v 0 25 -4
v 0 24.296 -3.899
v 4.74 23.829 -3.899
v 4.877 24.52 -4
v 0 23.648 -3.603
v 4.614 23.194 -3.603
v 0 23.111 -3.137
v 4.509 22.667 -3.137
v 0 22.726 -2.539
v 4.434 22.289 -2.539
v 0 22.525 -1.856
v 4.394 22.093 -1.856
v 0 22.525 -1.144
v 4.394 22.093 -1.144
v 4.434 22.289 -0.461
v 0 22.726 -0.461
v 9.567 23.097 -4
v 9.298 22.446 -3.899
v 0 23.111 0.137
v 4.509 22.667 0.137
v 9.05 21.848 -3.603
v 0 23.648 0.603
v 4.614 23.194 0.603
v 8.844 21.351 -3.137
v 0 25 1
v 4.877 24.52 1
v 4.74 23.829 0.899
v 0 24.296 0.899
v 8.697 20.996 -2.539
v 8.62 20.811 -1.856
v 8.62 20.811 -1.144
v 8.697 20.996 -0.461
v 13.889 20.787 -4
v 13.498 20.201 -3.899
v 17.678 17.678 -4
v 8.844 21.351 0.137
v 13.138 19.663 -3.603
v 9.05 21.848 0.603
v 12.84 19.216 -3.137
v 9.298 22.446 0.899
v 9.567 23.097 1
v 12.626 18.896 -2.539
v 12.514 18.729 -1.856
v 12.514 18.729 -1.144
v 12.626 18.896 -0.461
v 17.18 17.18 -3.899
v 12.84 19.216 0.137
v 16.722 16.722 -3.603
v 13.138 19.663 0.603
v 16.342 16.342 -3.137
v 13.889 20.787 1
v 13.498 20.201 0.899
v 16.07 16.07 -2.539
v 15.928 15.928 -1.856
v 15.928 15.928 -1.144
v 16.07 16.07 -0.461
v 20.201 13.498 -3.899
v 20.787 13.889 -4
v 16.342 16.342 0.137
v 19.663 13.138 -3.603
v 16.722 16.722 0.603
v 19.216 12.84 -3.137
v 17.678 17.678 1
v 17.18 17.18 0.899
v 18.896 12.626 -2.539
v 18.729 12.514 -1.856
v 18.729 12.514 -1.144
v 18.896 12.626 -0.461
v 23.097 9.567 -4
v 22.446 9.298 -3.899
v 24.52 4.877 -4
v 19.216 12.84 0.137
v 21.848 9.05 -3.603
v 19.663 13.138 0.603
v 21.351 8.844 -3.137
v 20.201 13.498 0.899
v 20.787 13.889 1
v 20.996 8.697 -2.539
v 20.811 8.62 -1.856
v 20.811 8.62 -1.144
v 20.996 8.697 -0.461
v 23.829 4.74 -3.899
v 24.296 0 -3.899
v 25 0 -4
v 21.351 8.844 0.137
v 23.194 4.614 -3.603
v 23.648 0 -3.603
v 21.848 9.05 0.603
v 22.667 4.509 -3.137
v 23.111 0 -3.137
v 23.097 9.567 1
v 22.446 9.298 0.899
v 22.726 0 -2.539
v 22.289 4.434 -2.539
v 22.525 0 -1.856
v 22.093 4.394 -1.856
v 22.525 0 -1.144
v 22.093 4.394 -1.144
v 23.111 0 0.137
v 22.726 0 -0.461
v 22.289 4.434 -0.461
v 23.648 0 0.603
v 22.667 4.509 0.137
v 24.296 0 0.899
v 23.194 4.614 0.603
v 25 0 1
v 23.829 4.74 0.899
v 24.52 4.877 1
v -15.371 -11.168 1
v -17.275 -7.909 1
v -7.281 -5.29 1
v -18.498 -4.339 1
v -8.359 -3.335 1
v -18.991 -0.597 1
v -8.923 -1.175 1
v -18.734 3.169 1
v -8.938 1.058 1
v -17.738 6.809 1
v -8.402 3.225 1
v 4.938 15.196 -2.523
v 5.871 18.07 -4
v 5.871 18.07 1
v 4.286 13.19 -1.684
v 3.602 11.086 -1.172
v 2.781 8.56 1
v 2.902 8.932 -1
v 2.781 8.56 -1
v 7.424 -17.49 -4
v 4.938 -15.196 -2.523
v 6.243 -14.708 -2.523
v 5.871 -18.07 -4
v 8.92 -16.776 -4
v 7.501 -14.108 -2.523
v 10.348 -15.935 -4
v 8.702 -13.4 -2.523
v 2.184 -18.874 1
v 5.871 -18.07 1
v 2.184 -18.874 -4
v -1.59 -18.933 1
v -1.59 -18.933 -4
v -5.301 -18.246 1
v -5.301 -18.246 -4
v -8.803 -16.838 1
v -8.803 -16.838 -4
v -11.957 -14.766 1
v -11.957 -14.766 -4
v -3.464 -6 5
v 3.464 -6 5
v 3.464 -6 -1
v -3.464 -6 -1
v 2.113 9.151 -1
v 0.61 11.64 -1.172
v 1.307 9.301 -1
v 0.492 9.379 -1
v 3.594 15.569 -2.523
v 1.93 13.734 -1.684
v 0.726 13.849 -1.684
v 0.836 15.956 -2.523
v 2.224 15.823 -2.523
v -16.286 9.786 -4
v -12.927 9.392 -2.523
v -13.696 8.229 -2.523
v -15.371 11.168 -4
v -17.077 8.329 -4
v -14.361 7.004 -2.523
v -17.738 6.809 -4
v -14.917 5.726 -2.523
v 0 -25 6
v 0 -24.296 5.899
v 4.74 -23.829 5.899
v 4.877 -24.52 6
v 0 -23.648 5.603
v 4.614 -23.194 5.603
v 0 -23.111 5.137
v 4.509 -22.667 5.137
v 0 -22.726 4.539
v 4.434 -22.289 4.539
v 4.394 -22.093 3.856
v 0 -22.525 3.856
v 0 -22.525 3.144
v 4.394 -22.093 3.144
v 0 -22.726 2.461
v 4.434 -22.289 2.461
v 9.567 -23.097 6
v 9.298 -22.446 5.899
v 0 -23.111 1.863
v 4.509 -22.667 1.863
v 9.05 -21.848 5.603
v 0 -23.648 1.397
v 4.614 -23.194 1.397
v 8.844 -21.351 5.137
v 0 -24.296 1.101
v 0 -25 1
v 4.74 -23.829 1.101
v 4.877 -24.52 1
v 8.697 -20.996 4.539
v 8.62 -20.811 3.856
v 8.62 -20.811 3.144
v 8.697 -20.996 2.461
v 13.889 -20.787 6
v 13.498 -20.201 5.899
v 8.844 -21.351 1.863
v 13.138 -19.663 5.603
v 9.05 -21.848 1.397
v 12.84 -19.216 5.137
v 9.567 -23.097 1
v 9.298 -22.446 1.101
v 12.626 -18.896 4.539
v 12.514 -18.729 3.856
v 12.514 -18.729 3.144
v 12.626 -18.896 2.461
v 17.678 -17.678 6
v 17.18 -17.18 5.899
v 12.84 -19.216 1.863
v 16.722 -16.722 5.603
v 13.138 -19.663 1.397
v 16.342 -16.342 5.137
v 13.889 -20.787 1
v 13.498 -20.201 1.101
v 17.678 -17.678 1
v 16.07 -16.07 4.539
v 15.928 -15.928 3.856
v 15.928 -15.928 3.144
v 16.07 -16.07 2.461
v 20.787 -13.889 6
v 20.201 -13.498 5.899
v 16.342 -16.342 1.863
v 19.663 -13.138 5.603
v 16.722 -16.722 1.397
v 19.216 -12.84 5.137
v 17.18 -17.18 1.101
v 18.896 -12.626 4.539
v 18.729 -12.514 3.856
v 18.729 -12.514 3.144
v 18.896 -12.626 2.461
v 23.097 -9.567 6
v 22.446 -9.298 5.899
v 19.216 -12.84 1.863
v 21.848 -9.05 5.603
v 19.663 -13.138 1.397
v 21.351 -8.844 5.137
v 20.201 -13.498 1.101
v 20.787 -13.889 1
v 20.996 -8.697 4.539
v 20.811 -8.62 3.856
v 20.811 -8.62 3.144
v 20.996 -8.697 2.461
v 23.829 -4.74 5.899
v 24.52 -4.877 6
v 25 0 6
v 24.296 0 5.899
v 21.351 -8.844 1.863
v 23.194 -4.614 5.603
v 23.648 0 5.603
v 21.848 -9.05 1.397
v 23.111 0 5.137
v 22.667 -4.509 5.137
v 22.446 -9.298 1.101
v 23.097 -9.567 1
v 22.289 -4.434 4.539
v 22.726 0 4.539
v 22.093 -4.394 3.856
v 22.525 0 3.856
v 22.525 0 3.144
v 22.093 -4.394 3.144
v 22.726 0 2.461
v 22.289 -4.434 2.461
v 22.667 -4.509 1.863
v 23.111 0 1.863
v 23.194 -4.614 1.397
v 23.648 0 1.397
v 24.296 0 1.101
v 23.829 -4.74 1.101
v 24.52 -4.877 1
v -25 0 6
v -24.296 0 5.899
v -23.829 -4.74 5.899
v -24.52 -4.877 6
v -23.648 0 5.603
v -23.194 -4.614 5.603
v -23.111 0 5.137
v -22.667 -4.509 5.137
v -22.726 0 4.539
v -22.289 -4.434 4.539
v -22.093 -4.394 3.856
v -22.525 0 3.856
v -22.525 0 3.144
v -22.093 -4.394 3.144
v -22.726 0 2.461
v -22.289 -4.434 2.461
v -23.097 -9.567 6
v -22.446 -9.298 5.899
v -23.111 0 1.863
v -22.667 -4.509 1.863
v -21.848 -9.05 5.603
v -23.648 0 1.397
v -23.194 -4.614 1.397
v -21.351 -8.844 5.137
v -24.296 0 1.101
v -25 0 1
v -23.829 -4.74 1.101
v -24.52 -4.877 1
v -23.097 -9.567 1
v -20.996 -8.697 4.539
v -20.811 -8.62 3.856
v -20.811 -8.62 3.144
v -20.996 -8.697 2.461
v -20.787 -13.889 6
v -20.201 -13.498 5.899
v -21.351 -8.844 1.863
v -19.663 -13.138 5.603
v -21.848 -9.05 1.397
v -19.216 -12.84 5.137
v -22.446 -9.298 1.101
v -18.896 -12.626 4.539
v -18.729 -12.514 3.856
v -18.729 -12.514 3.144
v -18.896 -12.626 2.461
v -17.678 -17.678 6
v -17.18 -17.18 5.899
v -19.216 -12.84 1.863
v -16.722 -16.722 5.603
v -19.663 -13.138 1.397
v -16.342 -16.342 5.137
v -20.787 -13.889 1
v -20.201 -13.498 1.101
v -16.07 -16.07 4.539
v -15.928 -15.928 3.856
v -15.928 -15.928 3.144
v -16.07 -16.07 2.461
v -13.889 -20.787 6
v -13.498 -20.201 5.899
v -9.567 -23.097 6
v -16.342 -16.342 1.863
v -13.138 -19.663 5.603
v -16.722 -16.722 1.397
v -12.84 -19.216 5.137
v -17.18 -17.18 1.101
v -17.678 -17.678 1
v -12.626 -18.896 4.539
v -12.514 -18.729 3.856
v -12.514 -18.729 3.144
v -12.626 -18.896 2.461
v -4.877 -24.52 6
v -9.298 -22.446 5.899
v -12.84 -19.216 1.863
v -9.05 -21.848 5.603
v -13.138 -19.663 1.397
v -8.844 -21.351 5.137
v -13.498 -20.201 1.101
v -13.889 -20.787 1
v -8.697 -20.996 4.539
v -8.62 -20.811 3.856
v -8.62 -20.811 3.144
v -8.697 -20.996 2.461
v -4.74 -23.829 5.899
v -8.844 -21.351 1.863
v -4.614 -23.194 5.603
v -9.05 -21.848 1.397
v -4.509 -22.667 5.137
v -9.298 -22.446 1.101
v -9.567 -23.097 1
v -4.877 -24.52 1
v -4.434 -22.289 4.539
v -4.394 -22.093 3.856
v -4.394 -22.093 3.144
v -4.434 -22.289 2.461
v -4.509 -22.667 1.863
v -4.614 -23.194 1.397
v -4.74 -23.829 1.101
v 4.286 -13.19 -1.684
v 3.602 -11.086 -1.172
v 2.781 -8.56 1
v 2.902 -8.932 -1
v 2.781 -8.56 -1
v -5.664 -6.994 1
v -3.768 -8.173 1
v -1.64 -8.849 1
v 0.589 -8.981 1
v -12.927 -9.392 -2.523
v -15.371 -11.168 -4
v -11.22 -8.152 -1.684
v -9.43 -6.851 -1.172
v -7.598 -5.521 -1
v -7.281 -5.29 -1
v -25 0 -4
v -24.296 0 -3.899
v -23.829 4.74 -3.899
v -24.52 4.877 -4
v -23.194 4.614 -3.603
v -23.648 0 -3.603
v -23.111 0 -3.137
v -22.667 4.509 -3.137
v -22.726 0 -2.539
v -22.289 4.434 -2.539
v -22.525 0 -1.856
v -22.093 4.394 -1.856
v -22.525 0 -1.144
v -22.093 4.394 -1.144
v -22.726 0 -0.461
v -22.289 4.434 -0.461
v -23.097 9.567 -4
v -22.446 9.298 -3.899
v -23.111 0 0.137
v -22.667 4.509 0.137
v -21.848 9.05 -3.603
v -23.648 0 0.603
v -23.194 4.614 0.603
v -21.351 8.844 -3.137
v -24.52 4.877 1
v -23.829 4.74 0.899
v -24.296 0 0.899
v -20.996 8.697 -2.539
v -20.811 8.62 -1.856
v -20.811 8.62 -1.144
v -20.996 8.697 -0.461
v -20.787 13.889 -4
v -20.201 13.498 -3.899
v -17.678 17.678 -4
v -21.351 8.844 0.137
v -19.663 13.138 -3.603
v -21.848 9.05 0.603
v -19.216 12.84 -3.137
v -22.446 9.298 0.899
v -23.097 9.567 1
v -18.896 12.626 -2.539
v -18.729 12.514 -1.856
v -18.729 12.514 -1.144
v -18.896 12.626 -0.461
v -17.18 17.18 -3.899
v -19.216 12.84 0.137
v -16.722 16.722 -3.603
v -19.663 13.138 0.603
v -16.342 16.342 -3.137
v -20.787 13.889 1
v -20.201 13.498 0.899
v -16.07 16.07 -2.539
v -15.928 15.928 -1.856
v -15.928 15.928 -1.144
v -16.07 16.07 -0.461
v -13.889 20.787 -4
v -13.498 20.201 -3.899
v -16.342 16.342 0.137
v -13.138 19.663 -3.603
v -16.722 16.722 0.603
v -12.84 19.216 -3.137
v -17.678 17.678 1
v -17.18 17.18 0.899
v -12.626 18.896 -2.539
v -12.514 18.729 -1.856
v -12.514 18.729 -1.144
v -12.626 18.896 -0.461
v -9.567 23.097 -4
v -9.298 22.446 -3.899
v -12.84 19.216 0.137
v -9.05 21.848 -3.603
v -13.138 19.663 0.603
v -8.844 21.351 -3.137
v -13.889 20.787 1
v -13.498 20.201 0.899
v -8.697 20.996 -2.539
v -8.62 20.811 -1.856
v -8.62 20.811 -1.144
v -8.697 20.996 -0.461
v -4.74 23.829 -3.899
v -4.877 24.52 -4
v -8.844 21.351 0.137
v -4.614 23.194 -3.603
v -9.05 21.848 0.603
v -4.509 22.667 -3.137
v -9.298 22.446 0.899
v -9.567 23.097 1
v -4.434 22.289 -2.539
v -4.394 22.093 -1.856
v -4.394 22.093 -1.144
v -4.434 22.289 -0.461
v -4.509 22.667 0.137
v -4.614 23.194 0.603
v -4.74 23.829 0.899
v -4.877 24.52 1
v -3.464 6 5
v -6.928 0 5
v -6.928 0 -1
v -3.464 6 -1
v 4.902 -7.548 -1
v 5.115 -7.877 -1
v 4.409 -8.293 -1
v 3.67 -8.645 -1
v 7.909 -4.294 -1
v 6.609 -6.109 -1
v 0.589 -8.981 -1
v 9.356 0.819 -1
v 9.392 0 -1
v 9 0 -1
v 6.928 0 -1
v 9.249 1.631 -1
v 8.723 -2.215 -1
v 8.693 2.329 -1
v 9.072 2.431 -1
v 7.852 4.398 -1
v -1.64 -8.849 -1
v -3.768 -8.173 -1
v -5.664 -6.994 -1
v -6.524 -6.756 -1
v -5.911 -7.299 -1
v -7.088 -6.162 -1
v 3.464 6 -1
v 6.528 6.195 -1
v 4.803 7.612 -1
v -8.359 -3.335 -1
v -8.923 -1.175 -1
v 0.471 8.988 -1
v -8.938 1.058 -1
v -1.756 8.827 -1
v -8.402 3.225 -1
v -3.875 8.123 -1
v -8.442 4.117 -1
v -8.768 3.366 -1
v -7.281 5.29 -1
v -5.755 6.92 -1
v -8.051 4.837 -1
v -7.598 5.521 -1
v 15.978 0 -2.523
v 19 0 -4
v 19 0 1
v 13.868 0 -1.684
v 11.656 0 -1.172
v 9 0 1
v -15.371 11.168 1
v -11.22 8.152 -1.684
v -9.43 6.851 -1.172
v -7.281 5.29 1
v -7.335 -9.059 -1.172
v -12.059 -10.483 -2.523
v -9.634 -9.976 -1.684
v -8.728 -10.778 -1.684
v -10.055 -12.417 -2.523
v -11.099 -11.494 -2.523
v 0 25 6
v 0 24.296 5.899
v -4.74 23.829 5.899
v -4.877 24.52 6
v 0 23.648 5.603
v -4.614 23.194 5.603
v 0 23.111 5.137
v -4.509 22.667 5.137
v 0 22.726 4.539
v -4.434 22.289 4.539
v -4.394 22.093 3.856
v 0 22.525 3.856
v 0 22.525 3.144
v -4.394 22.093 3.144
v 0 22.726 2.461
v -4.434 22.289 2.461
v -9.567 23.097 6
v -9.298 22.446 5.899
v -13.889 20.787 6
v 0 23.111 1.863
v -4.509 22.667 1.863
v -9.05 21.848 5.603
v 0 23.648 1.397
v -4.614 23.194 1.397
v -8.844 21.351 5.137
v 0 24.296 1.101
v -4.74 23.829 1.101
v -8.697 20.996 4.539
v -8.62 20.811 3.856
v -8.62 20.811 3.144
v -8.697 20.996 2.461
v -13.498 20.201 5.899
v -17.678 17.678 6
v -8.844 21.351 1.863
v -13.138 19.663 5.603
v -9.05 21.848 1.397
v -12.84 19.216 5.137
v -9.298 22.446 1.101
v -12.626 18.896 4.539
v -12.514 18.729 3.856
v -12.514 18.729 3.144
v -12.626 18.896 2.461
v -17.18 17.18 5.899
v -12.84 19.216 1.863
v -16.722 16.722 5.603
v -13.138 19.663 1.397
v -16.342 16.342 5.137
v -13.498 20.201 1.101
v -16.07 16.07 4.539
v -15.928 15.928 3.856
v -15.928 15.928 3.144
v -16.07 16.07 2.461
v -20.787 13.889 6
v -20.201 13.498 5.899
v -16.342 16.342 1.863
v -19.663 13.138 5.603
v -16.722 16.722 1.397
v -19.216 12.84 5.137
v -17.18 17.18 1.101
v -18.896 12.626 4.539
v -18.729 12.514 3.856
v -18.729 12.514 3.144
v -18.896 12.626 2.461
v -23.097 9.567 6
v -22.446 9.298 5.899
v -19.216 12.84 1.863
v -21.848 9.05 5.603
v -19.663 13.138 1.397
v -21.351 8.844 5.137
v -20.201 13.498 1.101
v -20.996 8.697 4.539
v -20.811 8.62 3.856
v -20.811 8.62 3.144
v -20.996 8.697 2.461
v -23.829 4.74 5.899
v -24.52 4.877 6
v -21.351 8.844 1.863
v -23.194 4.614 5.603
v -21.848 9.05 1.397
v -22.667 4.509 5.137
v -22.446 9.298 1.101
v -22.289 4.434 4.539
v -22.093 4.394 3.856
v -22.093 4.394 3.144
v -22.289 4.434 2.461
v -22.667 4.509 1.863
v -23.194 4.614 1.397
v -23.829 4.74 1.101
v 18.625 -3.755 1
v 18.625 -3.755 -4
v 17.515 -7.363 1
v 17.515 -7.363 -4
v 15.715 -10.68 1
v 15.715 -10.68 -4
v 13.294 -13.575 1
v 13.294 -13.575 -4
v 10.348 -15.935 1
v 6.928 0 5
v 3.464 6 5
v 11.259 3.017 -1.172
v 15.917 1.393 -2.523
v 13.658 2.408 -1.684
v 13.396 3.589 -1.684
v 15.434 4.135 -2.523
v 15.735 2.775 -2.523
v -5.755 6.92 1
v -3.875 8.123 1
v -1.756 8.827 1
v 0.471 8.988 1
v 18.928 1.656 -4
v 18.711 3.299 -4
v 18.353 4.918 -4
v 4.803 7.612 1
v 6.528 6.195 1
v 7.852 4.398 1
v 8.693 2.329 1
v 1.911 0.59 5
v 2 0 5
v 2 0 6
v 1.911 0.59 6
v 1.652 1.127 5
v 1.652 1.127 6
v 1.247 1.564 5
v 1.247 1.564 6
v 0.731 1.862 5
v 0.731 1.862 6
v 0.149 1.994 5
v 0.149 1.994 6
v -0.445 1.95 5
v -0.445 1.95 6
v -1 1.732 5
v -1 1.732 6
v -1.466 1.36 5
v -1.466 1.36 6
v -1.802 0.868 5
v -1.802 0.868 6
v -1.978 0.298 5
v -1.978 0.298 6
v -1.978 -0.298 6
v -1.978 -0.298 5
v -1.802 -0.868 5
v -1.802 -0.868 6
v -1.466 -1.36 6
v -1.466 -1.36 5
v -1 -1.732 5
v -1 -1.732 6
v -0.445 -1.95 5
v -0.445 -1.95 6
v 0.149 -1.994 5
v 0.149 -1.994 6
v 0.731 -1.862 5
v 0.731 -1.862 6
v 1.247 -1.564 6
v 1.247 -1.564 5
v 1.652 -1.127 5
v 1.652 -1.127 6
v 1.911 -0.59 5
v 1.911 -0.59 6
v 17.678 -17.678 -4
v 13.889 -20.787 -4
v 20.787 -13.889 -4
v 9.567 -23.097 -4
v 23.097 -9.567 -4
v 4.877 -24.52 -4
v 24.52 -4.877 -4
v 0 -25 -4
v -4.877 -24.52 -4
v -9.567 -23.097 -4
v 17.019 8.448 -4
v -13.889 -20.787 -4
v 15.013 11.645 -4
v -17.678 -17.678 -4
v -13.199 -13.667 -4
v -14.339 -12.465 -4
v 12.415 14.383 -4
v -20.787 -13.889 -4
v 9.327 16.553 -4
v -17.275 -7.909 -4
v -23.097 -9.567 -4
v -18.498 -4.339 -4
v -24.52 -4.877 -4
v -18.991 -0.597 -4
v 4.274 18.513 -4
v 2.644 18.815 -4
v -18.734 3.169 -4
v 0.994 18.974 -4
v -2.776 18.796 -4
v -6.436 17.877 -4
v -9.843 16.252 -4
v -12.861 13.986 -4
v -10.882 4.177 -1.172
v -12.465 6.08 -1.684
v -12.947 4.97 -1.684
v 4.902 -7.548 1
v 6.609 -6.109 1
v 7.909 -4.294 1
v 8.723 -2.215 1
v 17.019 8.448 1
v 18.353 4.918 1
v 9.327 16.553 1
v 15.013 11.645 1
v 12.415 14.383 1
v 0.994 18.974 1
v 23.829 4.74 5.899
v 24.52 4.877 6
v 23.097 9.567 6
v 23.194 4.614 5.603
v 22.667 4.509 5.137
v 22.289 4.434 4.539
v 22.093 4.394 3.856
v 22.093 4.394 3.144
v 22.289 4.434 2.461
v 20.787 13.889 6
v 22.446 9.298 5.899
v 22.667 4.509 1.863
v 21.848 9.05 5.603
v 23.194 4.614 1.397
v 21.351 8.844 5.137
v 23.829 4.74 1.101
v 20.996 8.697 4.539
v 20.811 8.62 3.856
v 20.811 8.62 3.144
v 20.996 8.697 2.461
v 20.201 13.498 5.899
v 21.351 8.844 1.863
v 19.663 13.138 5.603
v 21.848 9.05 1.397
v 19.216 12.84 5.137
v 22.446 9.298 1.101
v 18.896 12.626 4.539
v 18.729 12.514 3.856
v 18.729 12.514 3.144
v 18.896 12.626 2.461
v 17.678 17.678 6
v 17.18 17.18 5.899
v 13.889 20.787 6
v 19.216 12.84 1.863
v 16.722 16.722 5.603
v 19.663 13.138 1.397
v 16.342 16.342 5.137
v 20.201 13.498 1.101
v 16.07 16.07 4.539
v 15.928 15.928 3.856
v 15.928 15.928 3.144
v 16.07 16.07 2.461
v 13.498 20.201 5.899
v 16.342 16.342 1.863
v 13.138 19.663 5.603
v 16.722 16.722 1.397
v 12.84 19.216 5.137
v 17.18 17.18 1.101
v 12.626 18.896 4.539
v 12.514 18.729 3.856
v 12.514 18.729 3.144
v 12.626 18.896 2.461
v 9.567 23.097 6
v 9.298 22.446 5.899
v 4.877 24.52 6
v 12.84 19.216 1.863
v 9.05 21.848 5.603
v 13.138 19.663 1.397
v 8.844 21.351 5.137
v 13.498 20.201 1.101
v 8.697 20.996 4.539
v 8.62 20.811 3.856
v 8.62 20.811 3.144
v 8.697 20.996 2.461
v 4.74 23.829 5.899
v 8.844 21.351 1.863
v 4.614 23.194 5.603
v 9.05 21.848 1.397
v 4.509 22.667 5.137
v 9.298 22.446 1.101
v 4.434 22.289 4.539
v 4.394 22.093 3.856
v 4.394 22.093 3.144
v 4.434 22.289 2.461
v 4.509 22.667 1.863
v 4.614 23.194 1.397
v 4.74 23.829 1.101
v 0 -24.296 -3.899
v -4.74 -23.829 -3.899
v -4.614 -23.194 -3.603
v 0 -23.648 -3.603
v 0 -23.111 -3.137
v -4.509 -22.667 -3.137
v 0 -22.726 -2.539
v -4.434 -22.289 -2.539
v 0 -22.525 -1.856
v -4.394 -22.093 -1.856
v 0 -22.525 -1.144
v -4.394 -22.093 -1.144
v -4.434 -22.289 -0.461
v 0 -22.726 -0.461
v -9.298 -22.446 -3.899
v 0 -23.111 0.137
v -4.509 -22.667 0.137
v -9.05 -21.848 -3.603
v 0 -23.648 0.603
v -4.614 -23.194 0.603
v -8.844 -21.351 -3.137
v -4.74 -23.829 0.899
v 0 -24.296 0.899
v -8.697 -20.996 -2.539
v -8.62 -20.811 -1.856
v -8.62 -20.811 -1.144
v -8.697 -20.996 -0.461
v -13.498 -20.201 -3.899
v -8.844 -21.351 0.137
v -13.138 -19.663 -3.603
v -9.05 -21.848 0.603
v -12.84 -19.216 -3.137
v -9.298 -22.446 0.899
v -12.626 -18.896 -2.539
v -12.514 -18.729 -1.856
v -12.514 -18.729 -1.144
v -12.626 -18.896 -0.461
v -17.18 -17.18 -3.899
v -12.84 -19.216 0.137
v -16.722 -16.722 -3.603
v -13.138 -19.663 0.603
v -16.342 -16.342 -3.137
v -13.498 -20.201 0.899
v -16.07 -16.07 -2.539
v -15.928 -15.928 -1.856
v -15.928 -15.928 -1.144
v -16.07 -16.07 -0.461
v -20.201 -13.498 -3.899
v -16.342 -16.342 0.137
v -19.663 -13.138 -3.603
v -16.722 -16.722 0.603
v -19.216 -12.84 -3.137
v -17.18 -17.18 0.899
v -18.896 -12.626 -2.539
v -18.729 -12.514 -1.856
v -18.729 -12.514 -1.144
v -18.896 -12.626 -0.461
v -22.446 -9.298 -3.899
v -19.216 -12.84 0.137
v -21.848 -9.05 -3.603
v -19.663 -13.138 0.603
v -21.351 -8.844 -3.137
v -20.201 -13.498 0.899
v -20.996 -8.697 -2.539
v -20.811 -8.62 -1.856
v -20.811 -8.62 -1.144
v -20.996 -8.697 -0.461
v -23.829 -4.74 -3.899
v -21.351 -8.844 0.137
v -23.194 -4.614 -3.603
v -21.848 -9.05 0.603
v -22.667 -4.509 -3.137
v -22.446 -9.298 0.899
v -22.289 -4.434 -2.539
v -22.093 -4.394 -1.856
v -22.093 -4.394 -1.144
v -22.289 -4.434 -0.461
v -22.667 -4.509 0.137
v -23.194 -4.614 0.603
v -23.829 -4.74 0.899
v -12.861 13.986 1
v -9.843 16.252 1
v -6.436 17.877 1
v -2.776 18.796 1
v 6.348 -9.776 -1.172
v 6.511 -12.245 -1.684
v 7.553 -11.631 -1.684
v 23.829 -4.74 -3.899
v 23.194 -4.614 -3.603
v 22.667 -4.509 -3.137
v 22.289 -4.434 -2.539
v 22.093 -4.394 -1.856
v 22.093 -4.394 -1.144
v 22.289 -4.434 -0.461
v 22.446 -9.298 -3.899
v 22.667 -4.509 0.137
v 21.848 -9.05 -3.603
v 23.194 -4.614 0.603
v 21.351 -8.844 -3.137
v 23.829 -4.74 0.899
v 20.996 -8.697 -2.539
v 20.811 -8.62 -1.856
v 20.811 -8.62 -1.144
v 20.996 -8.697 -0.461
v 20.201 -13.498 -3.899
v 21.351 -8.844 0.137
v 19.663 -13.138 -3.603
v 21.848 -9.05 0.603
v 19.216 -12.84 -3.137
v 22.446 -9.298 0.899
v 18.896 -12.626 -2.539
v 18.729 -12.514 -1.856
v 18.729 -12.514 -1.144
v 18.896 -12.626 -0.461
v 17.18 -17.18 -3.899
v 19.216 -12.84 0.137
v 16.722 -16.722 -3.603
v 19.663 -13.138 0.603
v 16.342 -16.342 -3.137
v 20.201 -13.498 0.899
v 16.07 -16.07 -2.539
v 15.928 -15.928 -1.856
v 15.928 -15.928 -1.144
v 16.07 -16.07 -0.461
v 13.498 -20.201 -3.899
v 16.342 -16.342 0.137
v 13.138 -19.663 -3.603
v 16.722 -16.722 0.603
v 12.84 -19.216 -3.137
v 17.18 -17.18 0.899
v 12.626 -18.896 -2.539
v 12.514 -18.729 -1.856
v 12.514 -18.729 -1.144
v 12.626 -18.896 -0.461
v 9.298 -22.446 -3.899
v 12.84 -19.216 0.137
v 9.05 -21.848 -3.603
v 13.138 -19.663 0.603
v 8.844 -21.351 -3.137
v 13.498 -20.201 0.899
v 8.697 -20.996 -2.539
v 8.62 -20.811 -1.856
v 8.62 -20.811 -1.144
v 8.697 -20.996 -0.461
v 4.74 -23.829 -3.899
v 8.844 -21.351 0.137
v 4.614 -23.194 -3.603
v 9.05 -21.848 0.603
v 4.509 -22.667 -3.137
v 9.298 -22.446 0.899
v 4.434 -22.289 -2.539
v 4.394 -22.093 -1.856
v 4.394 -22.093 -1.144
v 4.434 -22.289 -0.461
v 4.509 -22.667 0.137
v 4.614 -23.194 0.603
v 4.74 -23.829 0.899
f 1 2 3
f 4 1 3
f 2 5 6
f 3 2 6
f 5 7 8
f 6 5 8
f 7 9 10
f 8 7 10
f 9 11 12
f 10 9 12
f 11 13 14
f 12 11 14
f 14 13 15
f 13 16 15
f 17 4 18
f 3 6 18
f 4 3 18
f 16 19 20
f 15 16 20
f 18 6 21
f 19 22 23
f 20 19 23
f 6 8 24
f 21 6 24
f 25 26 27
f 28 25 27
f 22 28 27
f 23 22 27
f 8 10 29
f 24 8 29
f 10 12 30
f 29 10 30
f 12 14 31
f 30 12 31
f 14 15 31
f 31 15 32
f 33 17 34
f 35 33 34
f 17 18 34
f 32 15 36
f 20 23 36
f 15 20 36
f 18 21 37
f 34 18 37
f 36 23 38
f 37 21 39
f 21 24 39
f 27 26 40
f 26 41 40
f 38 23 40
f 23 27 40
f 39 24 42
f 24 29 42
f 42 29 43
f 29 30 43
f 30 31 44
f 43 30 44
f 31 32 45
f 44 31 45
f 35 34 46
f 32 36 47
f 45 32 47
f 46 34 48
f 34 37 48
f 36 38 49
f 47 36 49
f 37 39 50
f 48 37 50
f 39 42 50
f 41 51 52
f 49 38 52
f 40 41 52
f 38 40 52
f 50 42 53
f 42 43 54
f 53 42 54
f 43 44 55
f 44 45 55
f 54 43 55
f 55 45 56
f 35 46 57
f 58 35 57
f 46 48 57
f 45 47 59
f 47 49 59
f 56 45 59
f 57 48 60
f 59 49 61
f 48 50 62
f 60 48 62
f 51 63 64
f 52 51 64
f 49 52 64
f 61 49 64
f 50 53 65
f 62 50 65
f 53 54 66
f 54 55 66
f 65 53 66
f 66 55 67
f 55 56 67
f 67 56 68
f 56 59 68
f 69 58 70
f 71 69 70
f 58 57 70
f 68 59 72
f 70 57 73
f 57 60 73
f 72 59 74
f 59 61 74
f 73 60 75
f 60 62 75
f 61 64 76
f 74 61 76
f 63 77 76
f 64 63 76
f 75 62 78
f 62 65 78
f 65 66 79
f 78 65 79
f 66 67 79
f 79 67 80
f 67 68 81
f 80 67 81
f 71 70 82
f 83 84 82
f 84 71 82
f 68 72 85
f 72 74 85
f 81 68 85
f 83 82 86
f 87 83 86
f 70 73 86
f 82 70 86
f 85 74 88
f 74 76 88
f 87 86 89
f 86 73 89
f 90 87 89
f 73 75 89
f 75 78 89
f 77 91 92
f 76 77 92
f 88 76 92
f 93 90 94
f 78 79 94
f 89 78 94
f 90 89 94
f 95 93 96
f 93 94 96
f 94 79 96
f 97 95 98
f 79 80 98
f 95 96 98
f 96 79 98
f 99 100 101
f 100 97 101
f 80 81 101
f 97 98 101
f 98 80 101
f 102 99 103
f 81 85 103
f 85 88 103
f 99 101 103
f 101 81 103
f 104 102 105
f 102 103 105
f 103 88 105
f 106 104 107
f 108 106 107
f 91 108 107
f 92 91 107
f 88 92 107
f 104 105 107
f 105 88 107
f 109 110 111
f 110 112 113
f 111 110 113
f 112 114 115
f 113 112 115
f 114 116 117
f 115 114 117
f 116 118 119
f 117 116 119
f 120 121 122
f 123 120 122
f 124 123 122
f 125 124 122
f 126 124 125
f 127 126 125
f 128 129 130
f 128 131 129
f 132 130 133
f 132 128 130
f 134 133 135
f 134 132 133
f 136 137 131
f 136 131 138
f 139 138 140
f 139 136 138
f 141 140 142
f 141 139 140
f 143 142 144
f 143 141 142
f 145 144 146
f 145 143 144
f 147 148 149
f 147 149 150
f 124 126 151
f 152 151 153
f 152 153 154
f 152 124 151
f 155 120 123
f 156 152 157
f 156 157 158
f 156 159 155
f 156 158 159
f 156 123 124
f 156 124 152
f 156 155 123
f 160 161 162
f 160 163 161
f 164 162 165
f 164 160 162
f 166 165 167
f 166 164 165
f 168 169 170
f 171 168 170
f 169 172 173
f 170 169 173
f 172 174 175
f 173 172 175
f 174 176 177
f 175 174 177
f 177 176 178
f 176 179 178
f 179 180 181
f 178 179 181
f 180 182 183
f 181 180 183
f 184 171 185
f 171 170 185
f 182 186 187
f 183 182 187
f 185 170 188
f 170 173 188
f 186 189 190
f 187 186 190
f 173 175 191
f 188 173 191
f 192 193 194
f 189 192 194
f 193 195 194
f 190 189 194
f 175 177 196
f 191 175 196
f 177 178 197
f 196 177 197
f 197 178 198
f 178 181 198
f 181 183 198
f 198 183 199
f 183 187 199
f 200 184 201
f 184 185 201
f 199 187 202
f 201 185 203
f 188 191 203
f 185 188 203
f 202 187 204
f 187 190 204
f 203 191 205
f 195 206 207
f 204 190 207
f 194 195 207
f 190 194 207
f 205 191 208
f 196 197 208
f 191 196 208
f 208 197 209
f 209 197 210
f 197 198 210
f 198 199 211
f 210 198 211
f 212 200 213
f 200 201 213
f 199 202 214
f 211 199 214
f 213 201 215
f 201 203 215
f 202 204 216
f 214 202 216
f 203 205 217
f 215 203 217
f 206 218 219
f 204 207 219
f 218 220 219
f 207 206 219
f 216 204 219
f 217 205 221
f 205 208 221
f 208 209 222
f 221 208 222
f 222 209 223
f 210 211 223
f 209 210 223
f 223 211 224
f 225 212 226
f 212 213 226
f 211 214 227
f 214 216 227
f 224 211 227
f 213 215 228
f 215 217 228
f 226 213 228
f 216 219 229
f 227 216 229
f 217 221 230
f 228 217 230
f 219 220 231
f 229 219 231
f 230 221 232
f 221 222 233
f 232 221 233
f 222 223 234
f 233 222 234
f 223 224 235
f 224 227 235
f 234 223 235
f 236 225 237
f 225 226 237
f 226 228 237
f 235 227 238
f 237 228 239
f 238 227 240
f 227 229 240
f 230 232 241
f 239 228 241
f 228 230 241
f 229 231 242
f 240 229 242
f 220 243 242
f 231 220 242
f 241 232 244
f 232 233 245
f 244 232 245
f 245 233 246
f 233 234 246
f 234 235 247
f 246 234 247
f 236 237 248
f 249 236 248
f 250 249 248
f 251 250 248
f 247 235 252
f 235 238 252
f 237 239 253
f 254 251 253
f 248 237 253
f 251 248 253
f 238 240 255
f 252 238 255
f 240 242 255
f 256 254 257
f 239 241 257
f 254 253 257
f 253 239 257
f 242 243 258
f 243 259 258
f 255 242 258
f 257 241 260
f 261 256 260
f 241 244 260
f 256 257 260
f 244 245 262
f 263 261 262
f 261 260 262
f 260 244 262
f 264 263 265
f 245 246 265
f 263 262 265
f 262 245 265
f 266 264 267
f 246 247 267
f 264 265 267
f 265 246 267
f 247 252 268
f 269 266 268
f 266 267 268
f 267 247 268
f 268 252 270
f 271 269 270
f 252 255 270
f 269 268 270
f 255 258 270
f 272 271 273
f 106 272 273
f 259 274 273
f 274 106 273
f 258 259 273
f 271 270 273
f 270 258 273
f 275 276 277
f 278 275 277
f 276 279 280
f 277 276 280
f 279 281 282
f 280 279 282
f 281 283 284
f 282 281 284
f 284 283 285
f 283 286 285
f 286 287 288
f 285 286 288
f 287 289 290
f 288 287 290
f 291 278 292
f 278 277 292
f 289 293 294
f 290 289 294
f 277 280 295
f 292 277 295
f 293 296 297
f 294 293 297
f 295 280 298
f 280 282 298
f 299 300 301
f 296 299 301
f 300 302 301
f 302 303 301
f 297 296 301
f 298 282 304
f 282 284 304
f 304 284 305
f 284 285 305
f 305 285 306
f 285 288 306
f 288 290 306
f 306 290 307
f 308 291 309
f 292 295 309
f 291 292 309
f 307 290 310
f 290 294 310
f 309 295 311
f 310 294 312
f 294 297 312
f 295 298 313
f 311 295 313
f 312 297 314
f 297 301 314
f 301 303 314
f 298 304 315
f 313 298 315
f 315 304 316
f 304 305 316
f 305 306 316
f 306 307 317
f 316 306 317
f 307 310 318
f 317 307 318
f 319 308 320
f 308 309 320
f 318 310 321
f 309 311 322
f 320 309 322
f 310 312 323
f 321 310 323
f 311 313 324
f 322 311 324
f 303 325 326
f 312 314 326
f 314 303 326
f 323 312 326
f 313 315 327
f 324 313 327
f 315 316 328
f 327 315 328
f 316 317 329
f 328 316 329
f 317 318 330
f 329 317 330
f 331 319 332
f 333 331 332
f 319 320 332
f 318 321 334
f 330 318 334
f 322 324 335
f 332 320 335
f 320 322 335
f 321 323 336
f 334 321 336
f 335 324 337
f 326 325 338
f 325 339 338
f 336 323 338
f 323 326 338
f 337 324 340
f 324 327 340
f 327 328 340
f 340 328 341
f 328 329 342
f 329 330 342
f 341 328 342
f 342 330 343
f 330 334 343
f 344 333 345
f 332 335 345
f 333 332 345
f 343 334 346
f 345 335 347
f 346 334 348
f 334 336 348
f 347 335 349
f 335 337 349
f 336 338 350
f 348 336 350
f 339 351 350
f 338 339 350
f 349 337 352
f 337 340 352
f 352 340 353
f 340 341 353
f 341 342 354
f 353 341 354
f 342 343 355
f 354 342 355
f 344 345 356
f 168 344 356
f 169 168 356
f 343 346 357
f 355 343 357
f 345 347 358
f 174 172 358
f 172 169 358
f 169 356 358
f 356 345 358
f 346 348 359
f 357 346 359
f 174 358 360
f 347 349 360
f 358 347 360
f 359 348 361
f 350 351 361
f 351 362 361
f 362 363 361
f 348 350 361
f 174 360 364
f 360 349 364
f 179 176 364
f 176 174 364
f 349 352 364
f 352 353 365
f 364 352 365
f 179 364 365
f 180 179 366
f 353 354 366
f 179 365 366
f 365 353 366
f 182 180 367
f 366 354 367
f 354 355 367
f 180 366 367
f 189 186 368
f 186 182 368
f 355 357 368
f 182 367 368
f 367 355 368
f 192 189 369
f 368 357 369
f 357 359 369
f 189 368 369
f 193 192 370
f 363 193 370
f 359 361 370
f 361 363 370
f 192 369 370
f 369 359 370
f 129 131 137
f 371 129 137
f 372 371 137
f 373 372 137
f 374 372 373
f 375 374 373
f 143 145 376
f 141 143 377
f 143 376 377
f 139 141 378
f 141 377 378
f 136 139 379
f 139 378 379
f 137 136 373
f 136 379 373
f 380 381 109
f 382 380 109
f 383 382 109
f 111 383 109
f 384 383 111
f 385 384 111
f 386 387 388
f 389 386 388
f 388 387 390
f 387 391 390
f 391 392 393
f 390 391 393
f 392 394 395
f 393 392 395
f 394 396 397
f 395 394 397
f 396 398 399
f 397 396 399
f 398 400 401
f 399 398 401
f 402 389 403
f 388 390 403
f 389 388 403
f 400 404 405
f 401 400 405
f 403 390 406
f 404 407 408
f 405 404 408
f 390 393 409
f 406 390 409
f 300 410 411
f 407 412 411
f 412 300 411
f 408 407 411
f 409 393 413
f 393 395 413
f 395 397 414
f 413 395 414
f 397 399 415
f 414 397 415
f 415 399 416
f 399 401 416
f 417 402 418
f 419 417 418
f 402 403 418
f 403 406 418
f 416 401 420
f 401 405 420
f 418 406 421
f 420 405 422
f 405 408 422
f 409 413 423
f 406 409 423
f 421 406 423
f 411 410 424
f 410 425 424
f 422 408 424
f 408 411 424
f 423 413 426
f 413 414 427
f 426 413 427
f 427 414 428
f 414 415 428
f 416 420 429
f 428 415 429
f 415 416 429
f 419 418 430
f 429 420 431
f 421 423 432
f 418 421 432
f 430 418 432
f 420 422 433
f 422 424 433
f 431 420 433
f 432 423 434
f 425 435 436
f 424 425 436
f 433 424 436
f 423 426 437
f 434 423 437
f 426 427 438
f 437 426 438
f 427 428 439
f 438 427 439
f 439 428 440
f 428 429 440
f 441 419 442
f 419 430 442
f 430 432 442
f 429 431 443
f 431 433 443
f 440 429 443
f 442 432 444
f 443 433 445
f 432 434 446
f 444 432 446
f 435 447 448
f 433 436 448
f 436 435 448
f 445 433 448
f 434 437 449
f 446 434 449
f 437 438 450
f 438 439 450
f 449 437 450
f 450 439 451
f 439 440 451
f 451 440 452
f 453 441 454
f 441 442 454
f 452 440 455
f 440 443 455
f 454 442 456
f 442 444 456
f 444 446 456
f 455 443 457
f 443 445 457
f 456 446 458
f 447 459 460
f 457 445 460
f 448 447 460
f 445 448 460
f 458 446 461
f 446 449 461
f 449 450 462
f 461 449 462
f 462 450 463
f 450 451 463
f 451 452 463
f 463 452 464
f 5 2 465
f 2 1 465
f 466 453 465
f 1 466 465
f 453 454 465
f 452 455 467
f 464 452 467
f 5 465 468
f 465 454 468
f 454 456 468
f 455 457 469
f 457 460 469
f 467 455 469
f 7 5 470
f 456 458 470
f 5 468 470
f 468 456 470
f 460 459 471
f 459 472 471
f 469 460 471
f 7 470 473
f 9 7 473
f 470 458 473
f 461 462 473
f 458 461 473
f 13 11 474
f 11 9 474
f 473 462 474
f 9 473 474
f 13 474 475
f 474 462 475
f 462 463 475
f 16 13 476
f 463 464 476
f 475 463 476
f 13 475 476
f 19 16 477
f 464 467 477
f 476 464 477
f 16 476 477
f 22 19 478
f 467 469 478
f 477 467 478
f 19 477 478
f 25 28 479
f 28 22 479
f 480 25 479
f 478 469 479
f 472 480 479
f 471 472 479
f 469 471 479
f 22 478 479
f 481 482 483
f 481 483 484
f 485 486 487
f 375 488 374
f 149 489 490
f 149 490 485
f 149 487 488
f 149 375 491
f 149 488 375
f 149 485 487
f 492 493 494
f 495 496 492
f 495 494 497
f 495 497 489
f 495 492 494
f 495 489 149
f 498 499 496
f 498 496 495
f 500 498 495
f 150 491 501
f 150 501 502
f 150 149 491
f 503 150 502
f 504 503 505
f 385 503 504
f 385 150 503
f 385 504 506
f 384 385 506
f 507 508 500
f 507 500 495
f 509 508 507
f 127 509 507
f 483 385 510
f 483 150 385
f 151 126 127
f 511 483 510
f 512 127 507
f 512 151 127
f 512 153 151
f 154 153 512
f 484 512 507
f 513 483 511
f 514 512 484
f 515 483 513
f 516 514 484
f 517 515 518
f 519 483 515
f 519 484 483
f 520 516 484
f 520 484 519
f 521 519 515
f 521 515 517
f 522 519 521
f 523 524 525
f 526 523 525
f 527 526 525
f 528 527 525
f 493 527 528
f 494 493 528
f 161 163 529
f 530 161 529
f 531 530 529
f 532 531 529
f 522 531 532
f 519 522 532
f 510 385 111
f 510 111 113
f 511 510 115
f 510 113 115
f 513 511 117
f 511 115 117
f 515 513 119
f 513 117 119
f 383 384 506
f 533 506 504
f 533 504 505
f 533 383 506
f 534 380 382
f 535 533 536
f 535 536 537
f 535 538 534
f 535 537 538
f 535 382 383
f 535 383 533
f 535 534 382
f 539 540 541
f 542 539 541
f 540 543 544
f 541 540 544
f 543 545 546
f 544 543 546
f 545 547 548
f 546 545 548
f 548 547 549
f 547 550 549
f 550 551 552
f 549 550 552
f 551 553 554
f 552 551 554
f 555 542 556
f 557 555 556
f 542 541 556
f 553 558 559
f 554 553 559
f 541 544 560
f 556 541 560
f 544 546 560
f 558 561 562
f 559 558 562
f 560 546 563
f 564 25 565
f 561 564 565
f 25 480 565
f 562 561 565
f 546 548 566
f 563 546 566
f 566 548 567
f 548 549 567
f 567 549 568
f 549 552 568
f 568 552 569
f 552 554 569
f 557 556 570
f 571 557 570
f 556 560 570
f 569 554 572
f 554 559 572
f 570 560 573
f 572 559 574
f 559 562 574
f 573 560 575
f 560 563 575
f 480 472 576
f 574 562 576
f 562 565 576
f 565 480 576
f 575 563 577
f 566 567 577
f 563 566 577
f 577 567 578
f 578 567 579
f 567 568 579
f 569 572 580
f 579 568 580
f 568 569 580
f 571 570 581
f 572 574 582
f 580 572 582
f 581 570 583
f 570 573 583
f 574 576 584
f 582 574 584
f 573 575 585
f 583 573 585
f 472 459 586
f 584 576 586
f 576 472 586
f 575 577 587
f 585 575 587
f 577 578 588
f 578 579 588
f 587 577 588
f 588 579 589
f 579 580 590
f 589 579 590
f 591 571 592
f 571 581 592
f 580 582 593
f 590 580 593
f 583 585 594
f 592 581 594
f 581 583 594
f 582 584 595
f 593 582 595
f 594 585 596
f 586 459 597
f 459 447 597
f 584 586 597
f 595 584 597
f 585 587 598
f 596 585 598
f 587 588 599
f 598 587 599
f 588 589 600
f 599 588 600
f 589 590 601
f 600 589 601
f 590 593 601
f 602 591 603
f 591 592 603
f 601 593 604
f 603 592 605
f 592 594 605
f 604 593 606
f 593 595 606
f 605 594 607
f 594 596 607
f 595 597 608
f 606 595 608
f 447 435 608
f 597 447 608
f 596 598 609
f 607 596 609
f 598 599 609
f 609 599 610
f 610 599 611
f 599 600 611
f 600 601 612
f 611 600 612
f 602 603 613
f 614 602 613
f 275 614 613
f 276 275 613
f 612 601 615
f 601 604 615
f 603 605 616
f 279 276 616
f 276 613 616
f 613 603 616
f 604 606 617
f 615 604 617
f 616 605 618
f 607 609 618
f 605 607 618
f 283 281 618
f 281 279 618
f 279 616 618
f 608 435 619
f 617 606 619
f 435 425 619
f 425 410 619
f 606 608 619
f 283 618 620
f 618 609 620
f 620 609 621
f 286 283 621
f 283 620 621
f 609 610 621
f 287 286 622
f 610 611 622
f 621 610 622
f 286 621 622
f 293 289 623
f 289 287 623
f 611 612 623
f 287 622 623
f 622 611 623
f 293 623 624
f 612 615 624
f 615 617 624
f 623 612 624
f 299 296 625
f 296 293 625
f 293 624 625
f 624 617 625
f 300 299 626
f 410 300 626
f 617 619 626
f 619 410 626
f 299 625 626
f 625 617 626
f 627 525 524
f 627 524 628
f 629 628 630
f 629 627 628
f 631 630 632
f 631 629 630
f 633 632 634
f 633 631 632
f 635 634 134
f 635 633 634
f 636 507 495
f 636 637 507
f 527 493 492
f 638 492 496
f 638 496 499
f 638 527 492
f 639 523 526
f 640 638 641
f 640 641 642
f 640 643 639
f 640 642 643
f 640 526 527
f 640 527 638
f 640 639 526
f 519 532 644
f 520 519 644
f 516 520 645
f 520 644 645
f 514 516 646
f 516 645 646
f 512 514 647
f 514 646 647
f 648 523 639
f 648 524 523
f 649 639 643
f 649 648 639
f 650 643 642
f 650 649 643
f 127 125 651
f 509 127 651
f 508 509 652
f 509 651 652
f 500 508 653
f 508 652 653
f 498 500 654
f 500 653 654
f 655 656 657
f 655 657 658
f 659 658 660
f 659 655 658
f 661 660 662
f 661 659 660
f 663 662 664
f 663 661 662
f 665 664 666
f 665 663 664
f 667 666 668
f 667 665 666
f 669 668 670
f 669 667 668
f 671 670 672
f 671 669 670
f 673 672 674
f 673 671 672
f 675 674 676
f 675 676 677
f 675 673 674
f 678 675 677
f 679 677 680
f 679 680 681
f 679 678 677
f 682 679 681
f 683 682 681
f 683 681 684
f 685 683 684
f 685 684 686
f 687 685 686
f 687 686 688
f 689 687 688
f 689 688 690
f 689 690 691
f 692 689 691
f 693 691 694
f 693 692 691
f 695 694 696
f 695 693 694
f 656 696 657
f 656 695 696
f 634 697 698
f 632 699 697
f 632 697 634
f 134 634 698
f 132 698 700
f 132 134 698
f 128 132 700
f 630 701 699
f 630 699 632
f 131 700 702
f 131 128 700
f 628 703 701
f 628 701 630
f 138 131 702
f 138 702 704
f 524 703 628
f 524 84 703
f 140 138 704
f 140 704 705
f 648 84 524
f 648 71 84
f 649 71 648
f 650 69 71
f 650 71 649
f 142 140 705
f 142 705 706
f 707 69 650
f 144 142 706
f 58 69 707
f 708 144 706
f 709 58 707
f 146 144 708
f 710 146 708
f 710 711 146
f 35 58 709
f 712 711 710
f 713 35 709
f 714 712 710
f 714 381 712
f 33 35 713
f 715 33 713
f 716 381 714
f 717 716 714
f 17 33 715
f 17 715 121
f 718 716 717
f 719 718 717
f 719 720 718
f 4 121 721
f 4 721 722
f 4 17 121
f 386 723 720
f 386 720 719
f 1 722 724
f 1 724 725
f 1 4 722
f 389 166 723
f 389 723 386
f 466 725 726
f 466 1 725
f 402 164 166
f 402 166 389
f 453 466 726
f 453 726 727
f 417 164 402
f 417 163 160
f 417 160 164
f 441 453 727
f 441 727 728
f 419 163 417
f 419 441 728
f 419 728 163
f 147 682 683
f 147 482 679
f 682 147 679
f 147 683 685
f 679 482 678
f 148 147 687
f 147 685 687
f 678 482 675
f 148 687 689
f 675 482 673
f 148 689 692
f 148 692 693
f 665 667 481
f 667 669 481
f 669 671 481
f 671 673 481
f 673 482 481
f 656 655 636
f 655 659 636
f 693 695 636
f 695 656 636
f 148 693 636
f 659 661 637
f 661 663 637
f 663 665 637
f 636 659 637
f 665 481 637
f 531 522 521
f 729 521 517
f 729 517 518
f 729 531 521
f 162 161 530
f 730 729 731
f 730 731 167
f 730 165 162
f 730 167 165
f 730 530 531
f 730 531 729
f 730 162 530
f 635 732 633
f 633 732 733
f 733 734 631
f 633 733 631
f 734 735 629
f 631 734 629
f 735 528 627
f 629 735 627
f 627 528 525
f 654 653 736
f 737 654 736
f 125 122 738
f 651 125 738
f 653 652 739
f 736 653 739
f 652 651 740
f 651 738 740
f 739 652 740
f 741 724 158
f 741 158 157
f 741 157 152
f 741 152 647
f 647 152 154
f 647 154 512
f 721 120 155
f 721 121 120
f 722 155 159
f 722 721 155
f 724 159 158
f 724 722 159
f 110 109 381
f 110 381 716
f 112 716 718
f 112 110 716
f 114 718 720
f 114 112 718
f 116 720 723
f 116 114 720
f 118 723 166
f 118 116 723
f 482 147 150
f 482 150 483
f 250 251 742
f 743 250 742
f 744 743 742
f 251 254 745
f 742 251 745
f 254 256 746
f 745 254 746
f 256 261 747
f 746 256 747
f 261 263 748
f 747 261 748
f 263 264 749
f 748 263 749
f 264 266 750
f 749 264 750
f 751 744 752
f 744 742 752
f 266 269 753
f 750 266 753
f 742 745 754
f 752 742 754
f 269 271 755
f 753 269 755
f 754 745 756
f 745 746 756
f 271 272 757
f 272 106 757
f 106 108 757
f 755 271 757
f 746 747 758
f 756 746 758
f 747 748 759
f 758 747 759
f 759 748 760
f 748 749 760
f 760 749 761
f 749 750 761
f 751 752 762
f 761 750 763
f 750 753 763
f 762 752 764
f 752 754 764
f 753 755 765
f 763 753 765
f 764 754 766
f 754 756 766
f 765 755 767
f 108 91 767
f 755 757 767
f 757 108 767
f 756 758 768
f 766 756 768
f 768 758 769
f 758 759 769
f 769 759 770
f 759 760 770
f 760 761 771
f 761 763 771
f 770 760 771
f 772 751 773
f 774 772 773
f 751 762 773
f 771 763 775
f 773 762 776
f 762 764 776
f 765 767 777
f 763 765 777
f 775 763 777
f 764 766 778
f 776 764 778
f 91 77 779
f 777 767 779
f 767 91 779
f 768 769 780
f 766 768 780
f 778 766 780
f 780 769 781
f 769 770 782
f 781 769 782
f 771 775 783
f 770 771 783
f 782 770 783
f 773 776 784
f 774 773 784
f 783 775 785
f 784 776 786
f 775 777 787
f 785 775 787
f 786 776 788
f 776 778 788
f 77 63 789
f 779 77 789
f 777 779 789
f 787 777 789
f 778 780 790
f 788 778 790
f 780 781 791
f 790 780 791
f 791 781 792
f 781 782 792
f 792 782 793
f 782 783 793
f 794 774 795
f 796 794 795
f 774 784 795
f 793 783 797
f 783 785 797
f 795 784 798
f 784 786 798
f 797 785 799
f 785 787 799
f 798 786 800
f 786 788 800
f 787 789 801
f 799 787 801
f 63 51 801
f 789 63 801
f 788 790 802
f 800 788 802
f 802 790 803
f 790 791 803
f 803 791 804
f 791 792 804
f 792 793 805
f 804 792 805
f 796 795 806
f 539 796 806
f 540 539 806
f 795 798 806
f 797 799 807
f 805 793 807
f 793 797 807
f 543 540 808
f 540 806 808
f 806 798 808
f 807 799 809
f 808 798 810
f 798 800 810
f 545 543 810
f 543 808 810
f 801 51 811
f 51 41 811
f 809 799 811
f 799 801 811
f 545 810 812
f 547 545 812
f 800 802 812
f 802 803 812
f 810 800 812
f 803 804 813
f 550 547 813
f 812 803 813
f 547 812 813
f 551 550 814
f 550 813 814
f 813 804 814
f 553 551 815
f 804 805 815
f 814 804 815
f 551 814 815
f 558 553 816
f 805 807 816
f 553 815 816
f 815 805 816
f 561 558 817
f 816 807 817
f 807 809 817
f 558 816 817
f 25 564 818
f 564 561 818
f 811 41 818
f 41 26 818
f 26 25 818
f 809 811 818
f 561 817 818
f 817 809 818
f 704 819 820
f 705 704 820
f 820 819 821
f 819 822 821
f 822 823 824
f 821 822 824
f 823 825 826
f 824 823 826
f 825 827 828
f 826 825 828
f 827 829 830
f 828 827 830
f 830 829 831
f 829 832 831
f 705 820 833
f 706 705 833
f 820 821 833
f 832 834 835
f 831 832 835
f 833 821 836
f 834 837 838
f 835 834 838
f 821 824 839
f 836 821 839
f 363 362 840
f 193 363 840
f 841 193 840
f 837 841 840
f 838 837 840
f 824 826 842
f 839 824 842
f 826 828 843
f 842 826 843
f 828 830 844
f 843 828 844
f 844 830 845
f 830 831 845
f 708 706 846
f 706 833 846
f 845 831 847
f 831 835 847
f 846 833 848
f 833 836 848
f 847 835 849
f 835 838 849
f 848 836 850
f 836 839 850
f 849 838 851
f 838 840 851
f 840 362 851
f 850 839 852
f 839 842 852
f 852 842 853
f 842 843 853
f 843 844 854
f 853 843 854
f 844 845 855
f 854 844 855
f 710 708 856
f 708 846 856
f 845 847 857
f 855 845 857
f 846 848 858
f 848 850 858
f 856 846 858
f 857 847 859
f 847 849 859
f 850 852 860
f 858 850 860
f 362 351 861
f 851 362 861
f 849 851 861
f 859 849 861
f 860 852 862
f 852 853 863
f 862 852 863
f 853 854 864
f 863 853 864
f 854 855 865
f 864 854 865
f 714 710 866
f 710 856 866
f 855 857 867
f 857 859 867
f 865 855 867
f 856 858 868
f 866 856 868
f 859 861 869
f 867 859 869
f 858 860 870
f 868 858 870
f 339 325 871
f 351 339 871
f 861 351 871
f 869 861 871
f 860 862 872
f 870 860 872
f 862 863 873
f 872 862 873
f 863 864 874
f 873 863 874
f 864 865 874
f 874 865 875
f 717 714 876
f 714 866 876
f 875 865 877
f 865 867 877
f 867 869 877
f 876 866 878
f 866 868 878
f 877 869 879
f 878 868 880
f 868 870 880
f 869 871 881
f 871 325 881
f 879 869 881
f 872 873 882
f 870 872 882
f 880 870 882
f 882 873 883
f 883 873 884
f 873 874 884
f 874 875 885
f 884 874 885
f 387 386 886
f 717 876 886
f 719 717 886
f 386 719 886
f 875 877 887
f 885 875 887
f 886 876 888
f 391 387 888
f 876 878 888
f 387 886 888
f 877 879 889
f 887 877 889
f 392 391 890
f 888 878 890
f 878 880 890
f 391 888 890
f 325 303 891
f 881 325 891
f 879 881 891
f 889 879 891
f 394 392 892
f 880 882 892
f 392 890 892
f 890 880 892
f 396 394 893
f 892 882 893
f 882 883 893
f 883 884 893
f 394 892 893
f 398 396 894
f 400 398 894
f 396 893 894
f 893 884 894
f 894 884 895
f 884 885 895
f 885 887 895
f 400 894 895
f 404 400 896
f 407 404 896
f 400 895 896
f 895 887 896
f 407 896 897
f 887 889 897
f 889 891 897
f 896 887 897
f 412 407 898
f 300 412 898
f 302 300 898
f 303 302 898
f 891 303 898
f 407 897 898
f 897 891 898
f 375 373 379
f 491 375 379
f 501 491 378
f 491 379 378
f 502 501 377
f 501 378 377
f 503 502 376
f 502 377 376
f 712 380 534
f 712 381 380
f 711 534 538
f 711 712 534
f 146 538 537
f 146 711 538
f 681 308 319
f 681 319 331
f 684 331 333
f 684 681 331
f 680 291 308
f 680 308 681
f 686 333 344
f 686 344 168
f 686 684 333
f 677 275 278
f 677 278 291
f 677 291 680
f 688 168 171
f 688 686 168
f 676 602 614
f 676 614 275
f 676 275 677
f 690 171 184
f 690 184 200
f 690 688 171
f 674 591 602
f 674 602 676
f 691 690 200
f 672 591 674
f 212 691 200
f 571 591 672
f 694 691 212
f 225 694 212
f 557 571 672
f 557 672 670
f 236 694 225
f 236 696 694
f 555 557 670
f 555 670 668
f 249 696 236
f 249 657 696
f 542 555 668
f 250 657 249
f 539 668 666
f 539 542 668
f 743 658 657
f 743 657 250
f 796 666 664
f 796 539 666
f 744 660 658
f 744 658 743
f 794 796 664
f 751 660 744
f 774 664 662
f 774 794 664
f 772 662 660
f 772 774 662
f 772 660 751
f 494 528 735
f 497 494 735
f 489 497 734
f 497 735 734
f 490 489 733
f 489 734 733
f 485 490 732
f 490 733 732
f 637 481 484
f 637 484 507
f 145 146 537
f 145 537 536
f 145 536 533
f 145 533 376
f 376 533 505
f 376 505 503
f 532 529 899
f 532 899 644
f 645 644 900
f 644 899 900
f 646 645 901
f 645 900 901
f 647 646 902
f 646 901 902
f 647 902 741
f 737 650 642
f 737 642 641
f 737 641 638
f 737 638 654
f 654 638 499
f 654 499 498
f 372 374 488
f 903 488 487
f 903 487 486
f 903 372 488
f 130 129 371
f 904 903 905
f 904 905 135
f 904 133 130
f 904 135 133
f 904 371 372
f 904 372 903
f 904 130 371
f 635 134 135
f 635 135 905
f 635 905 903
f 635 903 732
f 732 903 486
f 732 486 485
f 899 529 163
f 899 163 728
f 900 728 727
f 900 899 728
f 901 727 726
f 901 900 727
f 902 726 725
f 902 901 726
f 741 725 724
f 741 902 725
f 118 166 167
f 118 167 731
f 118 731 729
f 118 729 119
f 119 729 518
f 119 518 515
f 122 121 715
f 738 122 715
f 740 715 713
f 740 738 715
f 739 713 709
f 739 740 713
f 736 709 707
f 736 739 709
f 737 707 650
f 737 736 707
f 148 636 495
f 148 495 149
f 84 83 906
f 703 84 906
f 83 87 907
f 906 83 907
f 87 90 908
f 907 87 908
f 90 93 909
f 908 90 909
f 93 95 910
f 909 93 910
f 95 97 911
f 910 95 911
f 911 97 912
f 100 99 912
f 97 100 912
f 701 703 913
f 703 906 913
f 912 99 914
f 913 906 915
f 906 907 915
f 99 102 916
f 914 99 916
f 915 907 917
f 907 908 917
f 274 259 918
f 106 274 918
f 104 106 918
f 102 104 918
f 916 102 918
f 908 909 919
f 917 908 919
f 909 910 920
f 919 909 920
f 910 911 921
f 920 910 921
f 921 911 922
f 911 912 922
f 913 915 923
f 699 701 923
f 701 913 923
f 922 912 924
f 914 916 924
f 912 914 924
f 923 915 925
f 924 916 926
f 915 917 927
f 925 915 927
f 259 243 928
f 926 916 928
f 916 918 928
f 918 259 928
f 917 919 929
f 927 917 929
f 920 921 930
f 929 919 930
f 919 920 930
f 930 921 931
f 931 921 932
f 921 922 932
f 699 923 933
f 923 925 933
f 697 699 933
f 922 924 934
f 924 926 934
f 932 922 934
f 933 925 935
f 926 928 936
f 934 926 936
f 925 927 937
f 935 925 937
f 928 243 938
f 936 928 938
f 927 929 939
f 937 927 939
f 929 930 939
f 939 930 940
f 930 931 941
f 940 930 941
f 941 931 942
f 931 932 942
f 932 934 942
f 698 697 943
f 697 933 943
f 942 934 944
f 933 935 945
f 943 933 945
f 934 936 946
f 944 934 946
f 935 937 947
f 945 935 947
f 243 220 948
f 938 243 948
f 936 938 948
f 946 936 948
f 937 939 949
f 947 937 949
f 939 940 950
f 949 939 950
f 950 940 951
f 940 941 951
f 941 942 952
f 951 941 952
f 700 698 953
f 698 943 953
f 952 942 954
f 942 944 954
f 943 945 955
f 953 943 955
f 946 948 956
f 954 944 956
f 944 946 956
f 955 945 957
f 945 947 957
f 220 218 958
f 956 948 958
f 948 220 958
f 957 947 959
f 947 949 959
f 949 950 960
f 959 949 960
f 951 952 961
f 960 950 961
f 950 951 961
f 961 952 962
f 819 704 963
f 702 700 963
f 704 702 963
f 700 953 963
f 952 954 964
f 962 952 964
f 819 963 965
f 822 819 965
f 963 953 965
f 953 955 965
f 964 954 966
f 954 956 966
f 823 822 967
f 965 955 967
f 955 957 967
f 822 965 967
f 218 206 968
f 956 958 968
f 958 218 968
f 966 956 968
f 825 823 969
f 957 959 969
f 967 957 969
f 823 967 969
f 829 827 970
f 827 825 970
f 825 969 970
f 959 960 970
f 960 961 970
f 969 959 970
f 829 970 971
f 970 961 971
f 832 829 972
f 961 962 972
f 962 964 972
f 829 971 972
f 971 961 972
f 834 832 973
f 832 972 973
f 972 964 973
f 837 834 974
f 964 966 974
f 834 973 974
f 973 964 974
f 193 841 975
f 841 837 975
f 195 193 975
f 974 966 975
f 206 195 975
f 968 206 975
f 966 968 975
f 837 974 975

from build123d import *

# Parameters (mm, degrees)
EXTRUDE_START            = 1
SKETCH_1_R               = 25
EXTRUDE_1_DEPTH          = 4
SKETCH_4_R               = 25
SKETCH_4_R_2             = 2
EXTRUDE_3_DEPTH          = 1
SKETCH_6_R               = 2.5
SKETCH_8_R               = 25
SKETCH_8_R_2             = 19
EXTRUDE_4_DEPTH          = 5
SKETCH_11_R              = 9
EXTRUDE_6_DEPTH          = 2
REVOLVE_1_ANGLE          = 15
PATTERN_CIRCULAR_1_COUNT = 5
SKETCH_13_R              = 2.5


with BuildPart() as part:
    # 草图1 → 凸台-拉伸1 (new body)
    with BuildSketch(Plane.XY.offset(EXTRUDE_START)):
        Circle(SKETCH_1_R)
        Polygon((3.464101615, 6), (-3.464101615, 6), (-6.92820323, 0), (-3.464101615, -6), (3.464101615, -6), (6.92820323, 0), align=None, mode=Mode.SUBTRACT)
    extrude(amount=EXTRUDE_1_DEPTH)

    # 草图4 → 凸台-拉伸3 (add)
    with BuildSketch(Plane.XY.offset(5)):
        Circle(SKETCH_4_R)
        Circle(SKETCH_4_R_2, mode=Mode.SUBTRACT)
    extrude(amount=EXTRUDE_3_DEPTH)

    # 切除-扫描1: sweep along a curve in space
    with BuildLine() as sweep_1_path:
        ThreePointArc((25, 0, 1), (17.67766953, 17.67766953, 1), (0, 25, 1))
        ThreePointArc((0, 25, 1), (-17.67766953, 17.67766953, 1), (-25, 0, 1))
        ThreePointArc((-25, 0, 1), (-17.67766953, -17.67766953, 1), (0, -25, 1))
        ThreePointArc((0, -25, 1), (17.67766953, -17.67766953, 1), (25, 0, 1))
    # 草图6 → 切除-扫描1 (sweep, cut)
    with BuildSketch(Plane(origin=(0, 0, 0), x_dir=(1, 0, 0), z_dir=(0, 1, 0))):
        with Locations((-25, -3.5)):
            Circle(SKETCH_6_R)
    sweep(path=sweep_1_path.line, mode=Mode.SUBTRACT)

    # 草图8 → 凸台-拉伸4 (add)
    with BuildSketch(Plane(origin=(0, 0, 1), x_dir=(-1, 0, 0), z_dir=(0, 0, -1))):
        Circle(SKETCH_8_R)
        Circle(SKETCH_8_R_2, mode=Mode.SUBTRACT)
    extrude(amount=EXTRUDE_4_DEPTH)

    # 草图11 → 凸台-拉伸6 (add)
    with BuildSketch(Plane(origin=(0, 0, 1), x_dir=(-1, 0, 0), z_dir=(0, 0, -1))):
        with Locations(Location((0, 0, 0), (0, 0, 180))):
            Circle(SKETCH_11_R)
        Polygon((-3.464101615, 6), (-6.92820323, 0), (-3.464101615, -6), (3.464101615, -6), (6.92820323, 0), (3.464101615, 6), align=None, mode=Mode.SUBTRACT)
    extrude(amount=EXTRUDE_6_DEPTH)

    # 草图12 → 旋转1 (revolve)
    with BuildSketch(Plane(origin=(0, 0, 0), x_dir=(1, 0, 0), z_dir=(0, 1, 0))):
        with BuildLine():
            Line((19, 4), (19, -1))
            Line((19, -1), (9, -1))
            Line((9, -1), (9, 1))
            Line((9, 1), (9.392071205, 1))
            ThreePointArc((9.392071205, 1), (12.772046971, 1.385768449), (15.978171002, 2.52323149))
            Line((15.978171002, 2.52323149), (19, 4))
        make_face()
    revolve_1 = revolve(axis=Axis((0, 0, -23.418623899), (0, 0, 1)), revolution_arc=REVOLVE_1_ANGLE)

    # 阵列(圆周)1: 旋转1 ×5 about axis
    pattern_circular_1_axis = Axis((0, 0, 0), (0, 0, 1))
    for i in range(1, PATTERN_CIRCULAR_1_COUNT):
        add(revolve_1.rotate(pattern_circular_1_axis, i * 360 / PATTERN_CIRCULAR_1_COUNT))

    # 切除-扫描2: sweep along a curve in space
    with BuildLine() as sweep_2_path:
        ThreePointArc((-25, 0, -4), (-17.67766953, 17.67766953, -4), (0, 25, -4))
        ThreePointArc((0, 25, -4), (17.67766953, 17.67766953, -4), (25, 0, -4))
        ThreePointArc((25, 0, -4), (17.67766953, -17.67766953, -4), (0, -25, -4))
        ThreePointArc((0, -25, -4), (-17.67766953, -17.67766953, -4), (-25, 0, -4))
    # 草图13 → 切除-扫描2 (sweep, cut)
    with BuildSketch(Plane(origin=(0, 0, 0), x_dir=(1, 0, 0), z_dir=(0, 1, 0))):
        with Locations((-25, 1.5)):
            Circle(SKETCH_13_R)
    sweep(path=sweep_2_path.line, mode=Mode.SUBTRACT)


solid = part.part
